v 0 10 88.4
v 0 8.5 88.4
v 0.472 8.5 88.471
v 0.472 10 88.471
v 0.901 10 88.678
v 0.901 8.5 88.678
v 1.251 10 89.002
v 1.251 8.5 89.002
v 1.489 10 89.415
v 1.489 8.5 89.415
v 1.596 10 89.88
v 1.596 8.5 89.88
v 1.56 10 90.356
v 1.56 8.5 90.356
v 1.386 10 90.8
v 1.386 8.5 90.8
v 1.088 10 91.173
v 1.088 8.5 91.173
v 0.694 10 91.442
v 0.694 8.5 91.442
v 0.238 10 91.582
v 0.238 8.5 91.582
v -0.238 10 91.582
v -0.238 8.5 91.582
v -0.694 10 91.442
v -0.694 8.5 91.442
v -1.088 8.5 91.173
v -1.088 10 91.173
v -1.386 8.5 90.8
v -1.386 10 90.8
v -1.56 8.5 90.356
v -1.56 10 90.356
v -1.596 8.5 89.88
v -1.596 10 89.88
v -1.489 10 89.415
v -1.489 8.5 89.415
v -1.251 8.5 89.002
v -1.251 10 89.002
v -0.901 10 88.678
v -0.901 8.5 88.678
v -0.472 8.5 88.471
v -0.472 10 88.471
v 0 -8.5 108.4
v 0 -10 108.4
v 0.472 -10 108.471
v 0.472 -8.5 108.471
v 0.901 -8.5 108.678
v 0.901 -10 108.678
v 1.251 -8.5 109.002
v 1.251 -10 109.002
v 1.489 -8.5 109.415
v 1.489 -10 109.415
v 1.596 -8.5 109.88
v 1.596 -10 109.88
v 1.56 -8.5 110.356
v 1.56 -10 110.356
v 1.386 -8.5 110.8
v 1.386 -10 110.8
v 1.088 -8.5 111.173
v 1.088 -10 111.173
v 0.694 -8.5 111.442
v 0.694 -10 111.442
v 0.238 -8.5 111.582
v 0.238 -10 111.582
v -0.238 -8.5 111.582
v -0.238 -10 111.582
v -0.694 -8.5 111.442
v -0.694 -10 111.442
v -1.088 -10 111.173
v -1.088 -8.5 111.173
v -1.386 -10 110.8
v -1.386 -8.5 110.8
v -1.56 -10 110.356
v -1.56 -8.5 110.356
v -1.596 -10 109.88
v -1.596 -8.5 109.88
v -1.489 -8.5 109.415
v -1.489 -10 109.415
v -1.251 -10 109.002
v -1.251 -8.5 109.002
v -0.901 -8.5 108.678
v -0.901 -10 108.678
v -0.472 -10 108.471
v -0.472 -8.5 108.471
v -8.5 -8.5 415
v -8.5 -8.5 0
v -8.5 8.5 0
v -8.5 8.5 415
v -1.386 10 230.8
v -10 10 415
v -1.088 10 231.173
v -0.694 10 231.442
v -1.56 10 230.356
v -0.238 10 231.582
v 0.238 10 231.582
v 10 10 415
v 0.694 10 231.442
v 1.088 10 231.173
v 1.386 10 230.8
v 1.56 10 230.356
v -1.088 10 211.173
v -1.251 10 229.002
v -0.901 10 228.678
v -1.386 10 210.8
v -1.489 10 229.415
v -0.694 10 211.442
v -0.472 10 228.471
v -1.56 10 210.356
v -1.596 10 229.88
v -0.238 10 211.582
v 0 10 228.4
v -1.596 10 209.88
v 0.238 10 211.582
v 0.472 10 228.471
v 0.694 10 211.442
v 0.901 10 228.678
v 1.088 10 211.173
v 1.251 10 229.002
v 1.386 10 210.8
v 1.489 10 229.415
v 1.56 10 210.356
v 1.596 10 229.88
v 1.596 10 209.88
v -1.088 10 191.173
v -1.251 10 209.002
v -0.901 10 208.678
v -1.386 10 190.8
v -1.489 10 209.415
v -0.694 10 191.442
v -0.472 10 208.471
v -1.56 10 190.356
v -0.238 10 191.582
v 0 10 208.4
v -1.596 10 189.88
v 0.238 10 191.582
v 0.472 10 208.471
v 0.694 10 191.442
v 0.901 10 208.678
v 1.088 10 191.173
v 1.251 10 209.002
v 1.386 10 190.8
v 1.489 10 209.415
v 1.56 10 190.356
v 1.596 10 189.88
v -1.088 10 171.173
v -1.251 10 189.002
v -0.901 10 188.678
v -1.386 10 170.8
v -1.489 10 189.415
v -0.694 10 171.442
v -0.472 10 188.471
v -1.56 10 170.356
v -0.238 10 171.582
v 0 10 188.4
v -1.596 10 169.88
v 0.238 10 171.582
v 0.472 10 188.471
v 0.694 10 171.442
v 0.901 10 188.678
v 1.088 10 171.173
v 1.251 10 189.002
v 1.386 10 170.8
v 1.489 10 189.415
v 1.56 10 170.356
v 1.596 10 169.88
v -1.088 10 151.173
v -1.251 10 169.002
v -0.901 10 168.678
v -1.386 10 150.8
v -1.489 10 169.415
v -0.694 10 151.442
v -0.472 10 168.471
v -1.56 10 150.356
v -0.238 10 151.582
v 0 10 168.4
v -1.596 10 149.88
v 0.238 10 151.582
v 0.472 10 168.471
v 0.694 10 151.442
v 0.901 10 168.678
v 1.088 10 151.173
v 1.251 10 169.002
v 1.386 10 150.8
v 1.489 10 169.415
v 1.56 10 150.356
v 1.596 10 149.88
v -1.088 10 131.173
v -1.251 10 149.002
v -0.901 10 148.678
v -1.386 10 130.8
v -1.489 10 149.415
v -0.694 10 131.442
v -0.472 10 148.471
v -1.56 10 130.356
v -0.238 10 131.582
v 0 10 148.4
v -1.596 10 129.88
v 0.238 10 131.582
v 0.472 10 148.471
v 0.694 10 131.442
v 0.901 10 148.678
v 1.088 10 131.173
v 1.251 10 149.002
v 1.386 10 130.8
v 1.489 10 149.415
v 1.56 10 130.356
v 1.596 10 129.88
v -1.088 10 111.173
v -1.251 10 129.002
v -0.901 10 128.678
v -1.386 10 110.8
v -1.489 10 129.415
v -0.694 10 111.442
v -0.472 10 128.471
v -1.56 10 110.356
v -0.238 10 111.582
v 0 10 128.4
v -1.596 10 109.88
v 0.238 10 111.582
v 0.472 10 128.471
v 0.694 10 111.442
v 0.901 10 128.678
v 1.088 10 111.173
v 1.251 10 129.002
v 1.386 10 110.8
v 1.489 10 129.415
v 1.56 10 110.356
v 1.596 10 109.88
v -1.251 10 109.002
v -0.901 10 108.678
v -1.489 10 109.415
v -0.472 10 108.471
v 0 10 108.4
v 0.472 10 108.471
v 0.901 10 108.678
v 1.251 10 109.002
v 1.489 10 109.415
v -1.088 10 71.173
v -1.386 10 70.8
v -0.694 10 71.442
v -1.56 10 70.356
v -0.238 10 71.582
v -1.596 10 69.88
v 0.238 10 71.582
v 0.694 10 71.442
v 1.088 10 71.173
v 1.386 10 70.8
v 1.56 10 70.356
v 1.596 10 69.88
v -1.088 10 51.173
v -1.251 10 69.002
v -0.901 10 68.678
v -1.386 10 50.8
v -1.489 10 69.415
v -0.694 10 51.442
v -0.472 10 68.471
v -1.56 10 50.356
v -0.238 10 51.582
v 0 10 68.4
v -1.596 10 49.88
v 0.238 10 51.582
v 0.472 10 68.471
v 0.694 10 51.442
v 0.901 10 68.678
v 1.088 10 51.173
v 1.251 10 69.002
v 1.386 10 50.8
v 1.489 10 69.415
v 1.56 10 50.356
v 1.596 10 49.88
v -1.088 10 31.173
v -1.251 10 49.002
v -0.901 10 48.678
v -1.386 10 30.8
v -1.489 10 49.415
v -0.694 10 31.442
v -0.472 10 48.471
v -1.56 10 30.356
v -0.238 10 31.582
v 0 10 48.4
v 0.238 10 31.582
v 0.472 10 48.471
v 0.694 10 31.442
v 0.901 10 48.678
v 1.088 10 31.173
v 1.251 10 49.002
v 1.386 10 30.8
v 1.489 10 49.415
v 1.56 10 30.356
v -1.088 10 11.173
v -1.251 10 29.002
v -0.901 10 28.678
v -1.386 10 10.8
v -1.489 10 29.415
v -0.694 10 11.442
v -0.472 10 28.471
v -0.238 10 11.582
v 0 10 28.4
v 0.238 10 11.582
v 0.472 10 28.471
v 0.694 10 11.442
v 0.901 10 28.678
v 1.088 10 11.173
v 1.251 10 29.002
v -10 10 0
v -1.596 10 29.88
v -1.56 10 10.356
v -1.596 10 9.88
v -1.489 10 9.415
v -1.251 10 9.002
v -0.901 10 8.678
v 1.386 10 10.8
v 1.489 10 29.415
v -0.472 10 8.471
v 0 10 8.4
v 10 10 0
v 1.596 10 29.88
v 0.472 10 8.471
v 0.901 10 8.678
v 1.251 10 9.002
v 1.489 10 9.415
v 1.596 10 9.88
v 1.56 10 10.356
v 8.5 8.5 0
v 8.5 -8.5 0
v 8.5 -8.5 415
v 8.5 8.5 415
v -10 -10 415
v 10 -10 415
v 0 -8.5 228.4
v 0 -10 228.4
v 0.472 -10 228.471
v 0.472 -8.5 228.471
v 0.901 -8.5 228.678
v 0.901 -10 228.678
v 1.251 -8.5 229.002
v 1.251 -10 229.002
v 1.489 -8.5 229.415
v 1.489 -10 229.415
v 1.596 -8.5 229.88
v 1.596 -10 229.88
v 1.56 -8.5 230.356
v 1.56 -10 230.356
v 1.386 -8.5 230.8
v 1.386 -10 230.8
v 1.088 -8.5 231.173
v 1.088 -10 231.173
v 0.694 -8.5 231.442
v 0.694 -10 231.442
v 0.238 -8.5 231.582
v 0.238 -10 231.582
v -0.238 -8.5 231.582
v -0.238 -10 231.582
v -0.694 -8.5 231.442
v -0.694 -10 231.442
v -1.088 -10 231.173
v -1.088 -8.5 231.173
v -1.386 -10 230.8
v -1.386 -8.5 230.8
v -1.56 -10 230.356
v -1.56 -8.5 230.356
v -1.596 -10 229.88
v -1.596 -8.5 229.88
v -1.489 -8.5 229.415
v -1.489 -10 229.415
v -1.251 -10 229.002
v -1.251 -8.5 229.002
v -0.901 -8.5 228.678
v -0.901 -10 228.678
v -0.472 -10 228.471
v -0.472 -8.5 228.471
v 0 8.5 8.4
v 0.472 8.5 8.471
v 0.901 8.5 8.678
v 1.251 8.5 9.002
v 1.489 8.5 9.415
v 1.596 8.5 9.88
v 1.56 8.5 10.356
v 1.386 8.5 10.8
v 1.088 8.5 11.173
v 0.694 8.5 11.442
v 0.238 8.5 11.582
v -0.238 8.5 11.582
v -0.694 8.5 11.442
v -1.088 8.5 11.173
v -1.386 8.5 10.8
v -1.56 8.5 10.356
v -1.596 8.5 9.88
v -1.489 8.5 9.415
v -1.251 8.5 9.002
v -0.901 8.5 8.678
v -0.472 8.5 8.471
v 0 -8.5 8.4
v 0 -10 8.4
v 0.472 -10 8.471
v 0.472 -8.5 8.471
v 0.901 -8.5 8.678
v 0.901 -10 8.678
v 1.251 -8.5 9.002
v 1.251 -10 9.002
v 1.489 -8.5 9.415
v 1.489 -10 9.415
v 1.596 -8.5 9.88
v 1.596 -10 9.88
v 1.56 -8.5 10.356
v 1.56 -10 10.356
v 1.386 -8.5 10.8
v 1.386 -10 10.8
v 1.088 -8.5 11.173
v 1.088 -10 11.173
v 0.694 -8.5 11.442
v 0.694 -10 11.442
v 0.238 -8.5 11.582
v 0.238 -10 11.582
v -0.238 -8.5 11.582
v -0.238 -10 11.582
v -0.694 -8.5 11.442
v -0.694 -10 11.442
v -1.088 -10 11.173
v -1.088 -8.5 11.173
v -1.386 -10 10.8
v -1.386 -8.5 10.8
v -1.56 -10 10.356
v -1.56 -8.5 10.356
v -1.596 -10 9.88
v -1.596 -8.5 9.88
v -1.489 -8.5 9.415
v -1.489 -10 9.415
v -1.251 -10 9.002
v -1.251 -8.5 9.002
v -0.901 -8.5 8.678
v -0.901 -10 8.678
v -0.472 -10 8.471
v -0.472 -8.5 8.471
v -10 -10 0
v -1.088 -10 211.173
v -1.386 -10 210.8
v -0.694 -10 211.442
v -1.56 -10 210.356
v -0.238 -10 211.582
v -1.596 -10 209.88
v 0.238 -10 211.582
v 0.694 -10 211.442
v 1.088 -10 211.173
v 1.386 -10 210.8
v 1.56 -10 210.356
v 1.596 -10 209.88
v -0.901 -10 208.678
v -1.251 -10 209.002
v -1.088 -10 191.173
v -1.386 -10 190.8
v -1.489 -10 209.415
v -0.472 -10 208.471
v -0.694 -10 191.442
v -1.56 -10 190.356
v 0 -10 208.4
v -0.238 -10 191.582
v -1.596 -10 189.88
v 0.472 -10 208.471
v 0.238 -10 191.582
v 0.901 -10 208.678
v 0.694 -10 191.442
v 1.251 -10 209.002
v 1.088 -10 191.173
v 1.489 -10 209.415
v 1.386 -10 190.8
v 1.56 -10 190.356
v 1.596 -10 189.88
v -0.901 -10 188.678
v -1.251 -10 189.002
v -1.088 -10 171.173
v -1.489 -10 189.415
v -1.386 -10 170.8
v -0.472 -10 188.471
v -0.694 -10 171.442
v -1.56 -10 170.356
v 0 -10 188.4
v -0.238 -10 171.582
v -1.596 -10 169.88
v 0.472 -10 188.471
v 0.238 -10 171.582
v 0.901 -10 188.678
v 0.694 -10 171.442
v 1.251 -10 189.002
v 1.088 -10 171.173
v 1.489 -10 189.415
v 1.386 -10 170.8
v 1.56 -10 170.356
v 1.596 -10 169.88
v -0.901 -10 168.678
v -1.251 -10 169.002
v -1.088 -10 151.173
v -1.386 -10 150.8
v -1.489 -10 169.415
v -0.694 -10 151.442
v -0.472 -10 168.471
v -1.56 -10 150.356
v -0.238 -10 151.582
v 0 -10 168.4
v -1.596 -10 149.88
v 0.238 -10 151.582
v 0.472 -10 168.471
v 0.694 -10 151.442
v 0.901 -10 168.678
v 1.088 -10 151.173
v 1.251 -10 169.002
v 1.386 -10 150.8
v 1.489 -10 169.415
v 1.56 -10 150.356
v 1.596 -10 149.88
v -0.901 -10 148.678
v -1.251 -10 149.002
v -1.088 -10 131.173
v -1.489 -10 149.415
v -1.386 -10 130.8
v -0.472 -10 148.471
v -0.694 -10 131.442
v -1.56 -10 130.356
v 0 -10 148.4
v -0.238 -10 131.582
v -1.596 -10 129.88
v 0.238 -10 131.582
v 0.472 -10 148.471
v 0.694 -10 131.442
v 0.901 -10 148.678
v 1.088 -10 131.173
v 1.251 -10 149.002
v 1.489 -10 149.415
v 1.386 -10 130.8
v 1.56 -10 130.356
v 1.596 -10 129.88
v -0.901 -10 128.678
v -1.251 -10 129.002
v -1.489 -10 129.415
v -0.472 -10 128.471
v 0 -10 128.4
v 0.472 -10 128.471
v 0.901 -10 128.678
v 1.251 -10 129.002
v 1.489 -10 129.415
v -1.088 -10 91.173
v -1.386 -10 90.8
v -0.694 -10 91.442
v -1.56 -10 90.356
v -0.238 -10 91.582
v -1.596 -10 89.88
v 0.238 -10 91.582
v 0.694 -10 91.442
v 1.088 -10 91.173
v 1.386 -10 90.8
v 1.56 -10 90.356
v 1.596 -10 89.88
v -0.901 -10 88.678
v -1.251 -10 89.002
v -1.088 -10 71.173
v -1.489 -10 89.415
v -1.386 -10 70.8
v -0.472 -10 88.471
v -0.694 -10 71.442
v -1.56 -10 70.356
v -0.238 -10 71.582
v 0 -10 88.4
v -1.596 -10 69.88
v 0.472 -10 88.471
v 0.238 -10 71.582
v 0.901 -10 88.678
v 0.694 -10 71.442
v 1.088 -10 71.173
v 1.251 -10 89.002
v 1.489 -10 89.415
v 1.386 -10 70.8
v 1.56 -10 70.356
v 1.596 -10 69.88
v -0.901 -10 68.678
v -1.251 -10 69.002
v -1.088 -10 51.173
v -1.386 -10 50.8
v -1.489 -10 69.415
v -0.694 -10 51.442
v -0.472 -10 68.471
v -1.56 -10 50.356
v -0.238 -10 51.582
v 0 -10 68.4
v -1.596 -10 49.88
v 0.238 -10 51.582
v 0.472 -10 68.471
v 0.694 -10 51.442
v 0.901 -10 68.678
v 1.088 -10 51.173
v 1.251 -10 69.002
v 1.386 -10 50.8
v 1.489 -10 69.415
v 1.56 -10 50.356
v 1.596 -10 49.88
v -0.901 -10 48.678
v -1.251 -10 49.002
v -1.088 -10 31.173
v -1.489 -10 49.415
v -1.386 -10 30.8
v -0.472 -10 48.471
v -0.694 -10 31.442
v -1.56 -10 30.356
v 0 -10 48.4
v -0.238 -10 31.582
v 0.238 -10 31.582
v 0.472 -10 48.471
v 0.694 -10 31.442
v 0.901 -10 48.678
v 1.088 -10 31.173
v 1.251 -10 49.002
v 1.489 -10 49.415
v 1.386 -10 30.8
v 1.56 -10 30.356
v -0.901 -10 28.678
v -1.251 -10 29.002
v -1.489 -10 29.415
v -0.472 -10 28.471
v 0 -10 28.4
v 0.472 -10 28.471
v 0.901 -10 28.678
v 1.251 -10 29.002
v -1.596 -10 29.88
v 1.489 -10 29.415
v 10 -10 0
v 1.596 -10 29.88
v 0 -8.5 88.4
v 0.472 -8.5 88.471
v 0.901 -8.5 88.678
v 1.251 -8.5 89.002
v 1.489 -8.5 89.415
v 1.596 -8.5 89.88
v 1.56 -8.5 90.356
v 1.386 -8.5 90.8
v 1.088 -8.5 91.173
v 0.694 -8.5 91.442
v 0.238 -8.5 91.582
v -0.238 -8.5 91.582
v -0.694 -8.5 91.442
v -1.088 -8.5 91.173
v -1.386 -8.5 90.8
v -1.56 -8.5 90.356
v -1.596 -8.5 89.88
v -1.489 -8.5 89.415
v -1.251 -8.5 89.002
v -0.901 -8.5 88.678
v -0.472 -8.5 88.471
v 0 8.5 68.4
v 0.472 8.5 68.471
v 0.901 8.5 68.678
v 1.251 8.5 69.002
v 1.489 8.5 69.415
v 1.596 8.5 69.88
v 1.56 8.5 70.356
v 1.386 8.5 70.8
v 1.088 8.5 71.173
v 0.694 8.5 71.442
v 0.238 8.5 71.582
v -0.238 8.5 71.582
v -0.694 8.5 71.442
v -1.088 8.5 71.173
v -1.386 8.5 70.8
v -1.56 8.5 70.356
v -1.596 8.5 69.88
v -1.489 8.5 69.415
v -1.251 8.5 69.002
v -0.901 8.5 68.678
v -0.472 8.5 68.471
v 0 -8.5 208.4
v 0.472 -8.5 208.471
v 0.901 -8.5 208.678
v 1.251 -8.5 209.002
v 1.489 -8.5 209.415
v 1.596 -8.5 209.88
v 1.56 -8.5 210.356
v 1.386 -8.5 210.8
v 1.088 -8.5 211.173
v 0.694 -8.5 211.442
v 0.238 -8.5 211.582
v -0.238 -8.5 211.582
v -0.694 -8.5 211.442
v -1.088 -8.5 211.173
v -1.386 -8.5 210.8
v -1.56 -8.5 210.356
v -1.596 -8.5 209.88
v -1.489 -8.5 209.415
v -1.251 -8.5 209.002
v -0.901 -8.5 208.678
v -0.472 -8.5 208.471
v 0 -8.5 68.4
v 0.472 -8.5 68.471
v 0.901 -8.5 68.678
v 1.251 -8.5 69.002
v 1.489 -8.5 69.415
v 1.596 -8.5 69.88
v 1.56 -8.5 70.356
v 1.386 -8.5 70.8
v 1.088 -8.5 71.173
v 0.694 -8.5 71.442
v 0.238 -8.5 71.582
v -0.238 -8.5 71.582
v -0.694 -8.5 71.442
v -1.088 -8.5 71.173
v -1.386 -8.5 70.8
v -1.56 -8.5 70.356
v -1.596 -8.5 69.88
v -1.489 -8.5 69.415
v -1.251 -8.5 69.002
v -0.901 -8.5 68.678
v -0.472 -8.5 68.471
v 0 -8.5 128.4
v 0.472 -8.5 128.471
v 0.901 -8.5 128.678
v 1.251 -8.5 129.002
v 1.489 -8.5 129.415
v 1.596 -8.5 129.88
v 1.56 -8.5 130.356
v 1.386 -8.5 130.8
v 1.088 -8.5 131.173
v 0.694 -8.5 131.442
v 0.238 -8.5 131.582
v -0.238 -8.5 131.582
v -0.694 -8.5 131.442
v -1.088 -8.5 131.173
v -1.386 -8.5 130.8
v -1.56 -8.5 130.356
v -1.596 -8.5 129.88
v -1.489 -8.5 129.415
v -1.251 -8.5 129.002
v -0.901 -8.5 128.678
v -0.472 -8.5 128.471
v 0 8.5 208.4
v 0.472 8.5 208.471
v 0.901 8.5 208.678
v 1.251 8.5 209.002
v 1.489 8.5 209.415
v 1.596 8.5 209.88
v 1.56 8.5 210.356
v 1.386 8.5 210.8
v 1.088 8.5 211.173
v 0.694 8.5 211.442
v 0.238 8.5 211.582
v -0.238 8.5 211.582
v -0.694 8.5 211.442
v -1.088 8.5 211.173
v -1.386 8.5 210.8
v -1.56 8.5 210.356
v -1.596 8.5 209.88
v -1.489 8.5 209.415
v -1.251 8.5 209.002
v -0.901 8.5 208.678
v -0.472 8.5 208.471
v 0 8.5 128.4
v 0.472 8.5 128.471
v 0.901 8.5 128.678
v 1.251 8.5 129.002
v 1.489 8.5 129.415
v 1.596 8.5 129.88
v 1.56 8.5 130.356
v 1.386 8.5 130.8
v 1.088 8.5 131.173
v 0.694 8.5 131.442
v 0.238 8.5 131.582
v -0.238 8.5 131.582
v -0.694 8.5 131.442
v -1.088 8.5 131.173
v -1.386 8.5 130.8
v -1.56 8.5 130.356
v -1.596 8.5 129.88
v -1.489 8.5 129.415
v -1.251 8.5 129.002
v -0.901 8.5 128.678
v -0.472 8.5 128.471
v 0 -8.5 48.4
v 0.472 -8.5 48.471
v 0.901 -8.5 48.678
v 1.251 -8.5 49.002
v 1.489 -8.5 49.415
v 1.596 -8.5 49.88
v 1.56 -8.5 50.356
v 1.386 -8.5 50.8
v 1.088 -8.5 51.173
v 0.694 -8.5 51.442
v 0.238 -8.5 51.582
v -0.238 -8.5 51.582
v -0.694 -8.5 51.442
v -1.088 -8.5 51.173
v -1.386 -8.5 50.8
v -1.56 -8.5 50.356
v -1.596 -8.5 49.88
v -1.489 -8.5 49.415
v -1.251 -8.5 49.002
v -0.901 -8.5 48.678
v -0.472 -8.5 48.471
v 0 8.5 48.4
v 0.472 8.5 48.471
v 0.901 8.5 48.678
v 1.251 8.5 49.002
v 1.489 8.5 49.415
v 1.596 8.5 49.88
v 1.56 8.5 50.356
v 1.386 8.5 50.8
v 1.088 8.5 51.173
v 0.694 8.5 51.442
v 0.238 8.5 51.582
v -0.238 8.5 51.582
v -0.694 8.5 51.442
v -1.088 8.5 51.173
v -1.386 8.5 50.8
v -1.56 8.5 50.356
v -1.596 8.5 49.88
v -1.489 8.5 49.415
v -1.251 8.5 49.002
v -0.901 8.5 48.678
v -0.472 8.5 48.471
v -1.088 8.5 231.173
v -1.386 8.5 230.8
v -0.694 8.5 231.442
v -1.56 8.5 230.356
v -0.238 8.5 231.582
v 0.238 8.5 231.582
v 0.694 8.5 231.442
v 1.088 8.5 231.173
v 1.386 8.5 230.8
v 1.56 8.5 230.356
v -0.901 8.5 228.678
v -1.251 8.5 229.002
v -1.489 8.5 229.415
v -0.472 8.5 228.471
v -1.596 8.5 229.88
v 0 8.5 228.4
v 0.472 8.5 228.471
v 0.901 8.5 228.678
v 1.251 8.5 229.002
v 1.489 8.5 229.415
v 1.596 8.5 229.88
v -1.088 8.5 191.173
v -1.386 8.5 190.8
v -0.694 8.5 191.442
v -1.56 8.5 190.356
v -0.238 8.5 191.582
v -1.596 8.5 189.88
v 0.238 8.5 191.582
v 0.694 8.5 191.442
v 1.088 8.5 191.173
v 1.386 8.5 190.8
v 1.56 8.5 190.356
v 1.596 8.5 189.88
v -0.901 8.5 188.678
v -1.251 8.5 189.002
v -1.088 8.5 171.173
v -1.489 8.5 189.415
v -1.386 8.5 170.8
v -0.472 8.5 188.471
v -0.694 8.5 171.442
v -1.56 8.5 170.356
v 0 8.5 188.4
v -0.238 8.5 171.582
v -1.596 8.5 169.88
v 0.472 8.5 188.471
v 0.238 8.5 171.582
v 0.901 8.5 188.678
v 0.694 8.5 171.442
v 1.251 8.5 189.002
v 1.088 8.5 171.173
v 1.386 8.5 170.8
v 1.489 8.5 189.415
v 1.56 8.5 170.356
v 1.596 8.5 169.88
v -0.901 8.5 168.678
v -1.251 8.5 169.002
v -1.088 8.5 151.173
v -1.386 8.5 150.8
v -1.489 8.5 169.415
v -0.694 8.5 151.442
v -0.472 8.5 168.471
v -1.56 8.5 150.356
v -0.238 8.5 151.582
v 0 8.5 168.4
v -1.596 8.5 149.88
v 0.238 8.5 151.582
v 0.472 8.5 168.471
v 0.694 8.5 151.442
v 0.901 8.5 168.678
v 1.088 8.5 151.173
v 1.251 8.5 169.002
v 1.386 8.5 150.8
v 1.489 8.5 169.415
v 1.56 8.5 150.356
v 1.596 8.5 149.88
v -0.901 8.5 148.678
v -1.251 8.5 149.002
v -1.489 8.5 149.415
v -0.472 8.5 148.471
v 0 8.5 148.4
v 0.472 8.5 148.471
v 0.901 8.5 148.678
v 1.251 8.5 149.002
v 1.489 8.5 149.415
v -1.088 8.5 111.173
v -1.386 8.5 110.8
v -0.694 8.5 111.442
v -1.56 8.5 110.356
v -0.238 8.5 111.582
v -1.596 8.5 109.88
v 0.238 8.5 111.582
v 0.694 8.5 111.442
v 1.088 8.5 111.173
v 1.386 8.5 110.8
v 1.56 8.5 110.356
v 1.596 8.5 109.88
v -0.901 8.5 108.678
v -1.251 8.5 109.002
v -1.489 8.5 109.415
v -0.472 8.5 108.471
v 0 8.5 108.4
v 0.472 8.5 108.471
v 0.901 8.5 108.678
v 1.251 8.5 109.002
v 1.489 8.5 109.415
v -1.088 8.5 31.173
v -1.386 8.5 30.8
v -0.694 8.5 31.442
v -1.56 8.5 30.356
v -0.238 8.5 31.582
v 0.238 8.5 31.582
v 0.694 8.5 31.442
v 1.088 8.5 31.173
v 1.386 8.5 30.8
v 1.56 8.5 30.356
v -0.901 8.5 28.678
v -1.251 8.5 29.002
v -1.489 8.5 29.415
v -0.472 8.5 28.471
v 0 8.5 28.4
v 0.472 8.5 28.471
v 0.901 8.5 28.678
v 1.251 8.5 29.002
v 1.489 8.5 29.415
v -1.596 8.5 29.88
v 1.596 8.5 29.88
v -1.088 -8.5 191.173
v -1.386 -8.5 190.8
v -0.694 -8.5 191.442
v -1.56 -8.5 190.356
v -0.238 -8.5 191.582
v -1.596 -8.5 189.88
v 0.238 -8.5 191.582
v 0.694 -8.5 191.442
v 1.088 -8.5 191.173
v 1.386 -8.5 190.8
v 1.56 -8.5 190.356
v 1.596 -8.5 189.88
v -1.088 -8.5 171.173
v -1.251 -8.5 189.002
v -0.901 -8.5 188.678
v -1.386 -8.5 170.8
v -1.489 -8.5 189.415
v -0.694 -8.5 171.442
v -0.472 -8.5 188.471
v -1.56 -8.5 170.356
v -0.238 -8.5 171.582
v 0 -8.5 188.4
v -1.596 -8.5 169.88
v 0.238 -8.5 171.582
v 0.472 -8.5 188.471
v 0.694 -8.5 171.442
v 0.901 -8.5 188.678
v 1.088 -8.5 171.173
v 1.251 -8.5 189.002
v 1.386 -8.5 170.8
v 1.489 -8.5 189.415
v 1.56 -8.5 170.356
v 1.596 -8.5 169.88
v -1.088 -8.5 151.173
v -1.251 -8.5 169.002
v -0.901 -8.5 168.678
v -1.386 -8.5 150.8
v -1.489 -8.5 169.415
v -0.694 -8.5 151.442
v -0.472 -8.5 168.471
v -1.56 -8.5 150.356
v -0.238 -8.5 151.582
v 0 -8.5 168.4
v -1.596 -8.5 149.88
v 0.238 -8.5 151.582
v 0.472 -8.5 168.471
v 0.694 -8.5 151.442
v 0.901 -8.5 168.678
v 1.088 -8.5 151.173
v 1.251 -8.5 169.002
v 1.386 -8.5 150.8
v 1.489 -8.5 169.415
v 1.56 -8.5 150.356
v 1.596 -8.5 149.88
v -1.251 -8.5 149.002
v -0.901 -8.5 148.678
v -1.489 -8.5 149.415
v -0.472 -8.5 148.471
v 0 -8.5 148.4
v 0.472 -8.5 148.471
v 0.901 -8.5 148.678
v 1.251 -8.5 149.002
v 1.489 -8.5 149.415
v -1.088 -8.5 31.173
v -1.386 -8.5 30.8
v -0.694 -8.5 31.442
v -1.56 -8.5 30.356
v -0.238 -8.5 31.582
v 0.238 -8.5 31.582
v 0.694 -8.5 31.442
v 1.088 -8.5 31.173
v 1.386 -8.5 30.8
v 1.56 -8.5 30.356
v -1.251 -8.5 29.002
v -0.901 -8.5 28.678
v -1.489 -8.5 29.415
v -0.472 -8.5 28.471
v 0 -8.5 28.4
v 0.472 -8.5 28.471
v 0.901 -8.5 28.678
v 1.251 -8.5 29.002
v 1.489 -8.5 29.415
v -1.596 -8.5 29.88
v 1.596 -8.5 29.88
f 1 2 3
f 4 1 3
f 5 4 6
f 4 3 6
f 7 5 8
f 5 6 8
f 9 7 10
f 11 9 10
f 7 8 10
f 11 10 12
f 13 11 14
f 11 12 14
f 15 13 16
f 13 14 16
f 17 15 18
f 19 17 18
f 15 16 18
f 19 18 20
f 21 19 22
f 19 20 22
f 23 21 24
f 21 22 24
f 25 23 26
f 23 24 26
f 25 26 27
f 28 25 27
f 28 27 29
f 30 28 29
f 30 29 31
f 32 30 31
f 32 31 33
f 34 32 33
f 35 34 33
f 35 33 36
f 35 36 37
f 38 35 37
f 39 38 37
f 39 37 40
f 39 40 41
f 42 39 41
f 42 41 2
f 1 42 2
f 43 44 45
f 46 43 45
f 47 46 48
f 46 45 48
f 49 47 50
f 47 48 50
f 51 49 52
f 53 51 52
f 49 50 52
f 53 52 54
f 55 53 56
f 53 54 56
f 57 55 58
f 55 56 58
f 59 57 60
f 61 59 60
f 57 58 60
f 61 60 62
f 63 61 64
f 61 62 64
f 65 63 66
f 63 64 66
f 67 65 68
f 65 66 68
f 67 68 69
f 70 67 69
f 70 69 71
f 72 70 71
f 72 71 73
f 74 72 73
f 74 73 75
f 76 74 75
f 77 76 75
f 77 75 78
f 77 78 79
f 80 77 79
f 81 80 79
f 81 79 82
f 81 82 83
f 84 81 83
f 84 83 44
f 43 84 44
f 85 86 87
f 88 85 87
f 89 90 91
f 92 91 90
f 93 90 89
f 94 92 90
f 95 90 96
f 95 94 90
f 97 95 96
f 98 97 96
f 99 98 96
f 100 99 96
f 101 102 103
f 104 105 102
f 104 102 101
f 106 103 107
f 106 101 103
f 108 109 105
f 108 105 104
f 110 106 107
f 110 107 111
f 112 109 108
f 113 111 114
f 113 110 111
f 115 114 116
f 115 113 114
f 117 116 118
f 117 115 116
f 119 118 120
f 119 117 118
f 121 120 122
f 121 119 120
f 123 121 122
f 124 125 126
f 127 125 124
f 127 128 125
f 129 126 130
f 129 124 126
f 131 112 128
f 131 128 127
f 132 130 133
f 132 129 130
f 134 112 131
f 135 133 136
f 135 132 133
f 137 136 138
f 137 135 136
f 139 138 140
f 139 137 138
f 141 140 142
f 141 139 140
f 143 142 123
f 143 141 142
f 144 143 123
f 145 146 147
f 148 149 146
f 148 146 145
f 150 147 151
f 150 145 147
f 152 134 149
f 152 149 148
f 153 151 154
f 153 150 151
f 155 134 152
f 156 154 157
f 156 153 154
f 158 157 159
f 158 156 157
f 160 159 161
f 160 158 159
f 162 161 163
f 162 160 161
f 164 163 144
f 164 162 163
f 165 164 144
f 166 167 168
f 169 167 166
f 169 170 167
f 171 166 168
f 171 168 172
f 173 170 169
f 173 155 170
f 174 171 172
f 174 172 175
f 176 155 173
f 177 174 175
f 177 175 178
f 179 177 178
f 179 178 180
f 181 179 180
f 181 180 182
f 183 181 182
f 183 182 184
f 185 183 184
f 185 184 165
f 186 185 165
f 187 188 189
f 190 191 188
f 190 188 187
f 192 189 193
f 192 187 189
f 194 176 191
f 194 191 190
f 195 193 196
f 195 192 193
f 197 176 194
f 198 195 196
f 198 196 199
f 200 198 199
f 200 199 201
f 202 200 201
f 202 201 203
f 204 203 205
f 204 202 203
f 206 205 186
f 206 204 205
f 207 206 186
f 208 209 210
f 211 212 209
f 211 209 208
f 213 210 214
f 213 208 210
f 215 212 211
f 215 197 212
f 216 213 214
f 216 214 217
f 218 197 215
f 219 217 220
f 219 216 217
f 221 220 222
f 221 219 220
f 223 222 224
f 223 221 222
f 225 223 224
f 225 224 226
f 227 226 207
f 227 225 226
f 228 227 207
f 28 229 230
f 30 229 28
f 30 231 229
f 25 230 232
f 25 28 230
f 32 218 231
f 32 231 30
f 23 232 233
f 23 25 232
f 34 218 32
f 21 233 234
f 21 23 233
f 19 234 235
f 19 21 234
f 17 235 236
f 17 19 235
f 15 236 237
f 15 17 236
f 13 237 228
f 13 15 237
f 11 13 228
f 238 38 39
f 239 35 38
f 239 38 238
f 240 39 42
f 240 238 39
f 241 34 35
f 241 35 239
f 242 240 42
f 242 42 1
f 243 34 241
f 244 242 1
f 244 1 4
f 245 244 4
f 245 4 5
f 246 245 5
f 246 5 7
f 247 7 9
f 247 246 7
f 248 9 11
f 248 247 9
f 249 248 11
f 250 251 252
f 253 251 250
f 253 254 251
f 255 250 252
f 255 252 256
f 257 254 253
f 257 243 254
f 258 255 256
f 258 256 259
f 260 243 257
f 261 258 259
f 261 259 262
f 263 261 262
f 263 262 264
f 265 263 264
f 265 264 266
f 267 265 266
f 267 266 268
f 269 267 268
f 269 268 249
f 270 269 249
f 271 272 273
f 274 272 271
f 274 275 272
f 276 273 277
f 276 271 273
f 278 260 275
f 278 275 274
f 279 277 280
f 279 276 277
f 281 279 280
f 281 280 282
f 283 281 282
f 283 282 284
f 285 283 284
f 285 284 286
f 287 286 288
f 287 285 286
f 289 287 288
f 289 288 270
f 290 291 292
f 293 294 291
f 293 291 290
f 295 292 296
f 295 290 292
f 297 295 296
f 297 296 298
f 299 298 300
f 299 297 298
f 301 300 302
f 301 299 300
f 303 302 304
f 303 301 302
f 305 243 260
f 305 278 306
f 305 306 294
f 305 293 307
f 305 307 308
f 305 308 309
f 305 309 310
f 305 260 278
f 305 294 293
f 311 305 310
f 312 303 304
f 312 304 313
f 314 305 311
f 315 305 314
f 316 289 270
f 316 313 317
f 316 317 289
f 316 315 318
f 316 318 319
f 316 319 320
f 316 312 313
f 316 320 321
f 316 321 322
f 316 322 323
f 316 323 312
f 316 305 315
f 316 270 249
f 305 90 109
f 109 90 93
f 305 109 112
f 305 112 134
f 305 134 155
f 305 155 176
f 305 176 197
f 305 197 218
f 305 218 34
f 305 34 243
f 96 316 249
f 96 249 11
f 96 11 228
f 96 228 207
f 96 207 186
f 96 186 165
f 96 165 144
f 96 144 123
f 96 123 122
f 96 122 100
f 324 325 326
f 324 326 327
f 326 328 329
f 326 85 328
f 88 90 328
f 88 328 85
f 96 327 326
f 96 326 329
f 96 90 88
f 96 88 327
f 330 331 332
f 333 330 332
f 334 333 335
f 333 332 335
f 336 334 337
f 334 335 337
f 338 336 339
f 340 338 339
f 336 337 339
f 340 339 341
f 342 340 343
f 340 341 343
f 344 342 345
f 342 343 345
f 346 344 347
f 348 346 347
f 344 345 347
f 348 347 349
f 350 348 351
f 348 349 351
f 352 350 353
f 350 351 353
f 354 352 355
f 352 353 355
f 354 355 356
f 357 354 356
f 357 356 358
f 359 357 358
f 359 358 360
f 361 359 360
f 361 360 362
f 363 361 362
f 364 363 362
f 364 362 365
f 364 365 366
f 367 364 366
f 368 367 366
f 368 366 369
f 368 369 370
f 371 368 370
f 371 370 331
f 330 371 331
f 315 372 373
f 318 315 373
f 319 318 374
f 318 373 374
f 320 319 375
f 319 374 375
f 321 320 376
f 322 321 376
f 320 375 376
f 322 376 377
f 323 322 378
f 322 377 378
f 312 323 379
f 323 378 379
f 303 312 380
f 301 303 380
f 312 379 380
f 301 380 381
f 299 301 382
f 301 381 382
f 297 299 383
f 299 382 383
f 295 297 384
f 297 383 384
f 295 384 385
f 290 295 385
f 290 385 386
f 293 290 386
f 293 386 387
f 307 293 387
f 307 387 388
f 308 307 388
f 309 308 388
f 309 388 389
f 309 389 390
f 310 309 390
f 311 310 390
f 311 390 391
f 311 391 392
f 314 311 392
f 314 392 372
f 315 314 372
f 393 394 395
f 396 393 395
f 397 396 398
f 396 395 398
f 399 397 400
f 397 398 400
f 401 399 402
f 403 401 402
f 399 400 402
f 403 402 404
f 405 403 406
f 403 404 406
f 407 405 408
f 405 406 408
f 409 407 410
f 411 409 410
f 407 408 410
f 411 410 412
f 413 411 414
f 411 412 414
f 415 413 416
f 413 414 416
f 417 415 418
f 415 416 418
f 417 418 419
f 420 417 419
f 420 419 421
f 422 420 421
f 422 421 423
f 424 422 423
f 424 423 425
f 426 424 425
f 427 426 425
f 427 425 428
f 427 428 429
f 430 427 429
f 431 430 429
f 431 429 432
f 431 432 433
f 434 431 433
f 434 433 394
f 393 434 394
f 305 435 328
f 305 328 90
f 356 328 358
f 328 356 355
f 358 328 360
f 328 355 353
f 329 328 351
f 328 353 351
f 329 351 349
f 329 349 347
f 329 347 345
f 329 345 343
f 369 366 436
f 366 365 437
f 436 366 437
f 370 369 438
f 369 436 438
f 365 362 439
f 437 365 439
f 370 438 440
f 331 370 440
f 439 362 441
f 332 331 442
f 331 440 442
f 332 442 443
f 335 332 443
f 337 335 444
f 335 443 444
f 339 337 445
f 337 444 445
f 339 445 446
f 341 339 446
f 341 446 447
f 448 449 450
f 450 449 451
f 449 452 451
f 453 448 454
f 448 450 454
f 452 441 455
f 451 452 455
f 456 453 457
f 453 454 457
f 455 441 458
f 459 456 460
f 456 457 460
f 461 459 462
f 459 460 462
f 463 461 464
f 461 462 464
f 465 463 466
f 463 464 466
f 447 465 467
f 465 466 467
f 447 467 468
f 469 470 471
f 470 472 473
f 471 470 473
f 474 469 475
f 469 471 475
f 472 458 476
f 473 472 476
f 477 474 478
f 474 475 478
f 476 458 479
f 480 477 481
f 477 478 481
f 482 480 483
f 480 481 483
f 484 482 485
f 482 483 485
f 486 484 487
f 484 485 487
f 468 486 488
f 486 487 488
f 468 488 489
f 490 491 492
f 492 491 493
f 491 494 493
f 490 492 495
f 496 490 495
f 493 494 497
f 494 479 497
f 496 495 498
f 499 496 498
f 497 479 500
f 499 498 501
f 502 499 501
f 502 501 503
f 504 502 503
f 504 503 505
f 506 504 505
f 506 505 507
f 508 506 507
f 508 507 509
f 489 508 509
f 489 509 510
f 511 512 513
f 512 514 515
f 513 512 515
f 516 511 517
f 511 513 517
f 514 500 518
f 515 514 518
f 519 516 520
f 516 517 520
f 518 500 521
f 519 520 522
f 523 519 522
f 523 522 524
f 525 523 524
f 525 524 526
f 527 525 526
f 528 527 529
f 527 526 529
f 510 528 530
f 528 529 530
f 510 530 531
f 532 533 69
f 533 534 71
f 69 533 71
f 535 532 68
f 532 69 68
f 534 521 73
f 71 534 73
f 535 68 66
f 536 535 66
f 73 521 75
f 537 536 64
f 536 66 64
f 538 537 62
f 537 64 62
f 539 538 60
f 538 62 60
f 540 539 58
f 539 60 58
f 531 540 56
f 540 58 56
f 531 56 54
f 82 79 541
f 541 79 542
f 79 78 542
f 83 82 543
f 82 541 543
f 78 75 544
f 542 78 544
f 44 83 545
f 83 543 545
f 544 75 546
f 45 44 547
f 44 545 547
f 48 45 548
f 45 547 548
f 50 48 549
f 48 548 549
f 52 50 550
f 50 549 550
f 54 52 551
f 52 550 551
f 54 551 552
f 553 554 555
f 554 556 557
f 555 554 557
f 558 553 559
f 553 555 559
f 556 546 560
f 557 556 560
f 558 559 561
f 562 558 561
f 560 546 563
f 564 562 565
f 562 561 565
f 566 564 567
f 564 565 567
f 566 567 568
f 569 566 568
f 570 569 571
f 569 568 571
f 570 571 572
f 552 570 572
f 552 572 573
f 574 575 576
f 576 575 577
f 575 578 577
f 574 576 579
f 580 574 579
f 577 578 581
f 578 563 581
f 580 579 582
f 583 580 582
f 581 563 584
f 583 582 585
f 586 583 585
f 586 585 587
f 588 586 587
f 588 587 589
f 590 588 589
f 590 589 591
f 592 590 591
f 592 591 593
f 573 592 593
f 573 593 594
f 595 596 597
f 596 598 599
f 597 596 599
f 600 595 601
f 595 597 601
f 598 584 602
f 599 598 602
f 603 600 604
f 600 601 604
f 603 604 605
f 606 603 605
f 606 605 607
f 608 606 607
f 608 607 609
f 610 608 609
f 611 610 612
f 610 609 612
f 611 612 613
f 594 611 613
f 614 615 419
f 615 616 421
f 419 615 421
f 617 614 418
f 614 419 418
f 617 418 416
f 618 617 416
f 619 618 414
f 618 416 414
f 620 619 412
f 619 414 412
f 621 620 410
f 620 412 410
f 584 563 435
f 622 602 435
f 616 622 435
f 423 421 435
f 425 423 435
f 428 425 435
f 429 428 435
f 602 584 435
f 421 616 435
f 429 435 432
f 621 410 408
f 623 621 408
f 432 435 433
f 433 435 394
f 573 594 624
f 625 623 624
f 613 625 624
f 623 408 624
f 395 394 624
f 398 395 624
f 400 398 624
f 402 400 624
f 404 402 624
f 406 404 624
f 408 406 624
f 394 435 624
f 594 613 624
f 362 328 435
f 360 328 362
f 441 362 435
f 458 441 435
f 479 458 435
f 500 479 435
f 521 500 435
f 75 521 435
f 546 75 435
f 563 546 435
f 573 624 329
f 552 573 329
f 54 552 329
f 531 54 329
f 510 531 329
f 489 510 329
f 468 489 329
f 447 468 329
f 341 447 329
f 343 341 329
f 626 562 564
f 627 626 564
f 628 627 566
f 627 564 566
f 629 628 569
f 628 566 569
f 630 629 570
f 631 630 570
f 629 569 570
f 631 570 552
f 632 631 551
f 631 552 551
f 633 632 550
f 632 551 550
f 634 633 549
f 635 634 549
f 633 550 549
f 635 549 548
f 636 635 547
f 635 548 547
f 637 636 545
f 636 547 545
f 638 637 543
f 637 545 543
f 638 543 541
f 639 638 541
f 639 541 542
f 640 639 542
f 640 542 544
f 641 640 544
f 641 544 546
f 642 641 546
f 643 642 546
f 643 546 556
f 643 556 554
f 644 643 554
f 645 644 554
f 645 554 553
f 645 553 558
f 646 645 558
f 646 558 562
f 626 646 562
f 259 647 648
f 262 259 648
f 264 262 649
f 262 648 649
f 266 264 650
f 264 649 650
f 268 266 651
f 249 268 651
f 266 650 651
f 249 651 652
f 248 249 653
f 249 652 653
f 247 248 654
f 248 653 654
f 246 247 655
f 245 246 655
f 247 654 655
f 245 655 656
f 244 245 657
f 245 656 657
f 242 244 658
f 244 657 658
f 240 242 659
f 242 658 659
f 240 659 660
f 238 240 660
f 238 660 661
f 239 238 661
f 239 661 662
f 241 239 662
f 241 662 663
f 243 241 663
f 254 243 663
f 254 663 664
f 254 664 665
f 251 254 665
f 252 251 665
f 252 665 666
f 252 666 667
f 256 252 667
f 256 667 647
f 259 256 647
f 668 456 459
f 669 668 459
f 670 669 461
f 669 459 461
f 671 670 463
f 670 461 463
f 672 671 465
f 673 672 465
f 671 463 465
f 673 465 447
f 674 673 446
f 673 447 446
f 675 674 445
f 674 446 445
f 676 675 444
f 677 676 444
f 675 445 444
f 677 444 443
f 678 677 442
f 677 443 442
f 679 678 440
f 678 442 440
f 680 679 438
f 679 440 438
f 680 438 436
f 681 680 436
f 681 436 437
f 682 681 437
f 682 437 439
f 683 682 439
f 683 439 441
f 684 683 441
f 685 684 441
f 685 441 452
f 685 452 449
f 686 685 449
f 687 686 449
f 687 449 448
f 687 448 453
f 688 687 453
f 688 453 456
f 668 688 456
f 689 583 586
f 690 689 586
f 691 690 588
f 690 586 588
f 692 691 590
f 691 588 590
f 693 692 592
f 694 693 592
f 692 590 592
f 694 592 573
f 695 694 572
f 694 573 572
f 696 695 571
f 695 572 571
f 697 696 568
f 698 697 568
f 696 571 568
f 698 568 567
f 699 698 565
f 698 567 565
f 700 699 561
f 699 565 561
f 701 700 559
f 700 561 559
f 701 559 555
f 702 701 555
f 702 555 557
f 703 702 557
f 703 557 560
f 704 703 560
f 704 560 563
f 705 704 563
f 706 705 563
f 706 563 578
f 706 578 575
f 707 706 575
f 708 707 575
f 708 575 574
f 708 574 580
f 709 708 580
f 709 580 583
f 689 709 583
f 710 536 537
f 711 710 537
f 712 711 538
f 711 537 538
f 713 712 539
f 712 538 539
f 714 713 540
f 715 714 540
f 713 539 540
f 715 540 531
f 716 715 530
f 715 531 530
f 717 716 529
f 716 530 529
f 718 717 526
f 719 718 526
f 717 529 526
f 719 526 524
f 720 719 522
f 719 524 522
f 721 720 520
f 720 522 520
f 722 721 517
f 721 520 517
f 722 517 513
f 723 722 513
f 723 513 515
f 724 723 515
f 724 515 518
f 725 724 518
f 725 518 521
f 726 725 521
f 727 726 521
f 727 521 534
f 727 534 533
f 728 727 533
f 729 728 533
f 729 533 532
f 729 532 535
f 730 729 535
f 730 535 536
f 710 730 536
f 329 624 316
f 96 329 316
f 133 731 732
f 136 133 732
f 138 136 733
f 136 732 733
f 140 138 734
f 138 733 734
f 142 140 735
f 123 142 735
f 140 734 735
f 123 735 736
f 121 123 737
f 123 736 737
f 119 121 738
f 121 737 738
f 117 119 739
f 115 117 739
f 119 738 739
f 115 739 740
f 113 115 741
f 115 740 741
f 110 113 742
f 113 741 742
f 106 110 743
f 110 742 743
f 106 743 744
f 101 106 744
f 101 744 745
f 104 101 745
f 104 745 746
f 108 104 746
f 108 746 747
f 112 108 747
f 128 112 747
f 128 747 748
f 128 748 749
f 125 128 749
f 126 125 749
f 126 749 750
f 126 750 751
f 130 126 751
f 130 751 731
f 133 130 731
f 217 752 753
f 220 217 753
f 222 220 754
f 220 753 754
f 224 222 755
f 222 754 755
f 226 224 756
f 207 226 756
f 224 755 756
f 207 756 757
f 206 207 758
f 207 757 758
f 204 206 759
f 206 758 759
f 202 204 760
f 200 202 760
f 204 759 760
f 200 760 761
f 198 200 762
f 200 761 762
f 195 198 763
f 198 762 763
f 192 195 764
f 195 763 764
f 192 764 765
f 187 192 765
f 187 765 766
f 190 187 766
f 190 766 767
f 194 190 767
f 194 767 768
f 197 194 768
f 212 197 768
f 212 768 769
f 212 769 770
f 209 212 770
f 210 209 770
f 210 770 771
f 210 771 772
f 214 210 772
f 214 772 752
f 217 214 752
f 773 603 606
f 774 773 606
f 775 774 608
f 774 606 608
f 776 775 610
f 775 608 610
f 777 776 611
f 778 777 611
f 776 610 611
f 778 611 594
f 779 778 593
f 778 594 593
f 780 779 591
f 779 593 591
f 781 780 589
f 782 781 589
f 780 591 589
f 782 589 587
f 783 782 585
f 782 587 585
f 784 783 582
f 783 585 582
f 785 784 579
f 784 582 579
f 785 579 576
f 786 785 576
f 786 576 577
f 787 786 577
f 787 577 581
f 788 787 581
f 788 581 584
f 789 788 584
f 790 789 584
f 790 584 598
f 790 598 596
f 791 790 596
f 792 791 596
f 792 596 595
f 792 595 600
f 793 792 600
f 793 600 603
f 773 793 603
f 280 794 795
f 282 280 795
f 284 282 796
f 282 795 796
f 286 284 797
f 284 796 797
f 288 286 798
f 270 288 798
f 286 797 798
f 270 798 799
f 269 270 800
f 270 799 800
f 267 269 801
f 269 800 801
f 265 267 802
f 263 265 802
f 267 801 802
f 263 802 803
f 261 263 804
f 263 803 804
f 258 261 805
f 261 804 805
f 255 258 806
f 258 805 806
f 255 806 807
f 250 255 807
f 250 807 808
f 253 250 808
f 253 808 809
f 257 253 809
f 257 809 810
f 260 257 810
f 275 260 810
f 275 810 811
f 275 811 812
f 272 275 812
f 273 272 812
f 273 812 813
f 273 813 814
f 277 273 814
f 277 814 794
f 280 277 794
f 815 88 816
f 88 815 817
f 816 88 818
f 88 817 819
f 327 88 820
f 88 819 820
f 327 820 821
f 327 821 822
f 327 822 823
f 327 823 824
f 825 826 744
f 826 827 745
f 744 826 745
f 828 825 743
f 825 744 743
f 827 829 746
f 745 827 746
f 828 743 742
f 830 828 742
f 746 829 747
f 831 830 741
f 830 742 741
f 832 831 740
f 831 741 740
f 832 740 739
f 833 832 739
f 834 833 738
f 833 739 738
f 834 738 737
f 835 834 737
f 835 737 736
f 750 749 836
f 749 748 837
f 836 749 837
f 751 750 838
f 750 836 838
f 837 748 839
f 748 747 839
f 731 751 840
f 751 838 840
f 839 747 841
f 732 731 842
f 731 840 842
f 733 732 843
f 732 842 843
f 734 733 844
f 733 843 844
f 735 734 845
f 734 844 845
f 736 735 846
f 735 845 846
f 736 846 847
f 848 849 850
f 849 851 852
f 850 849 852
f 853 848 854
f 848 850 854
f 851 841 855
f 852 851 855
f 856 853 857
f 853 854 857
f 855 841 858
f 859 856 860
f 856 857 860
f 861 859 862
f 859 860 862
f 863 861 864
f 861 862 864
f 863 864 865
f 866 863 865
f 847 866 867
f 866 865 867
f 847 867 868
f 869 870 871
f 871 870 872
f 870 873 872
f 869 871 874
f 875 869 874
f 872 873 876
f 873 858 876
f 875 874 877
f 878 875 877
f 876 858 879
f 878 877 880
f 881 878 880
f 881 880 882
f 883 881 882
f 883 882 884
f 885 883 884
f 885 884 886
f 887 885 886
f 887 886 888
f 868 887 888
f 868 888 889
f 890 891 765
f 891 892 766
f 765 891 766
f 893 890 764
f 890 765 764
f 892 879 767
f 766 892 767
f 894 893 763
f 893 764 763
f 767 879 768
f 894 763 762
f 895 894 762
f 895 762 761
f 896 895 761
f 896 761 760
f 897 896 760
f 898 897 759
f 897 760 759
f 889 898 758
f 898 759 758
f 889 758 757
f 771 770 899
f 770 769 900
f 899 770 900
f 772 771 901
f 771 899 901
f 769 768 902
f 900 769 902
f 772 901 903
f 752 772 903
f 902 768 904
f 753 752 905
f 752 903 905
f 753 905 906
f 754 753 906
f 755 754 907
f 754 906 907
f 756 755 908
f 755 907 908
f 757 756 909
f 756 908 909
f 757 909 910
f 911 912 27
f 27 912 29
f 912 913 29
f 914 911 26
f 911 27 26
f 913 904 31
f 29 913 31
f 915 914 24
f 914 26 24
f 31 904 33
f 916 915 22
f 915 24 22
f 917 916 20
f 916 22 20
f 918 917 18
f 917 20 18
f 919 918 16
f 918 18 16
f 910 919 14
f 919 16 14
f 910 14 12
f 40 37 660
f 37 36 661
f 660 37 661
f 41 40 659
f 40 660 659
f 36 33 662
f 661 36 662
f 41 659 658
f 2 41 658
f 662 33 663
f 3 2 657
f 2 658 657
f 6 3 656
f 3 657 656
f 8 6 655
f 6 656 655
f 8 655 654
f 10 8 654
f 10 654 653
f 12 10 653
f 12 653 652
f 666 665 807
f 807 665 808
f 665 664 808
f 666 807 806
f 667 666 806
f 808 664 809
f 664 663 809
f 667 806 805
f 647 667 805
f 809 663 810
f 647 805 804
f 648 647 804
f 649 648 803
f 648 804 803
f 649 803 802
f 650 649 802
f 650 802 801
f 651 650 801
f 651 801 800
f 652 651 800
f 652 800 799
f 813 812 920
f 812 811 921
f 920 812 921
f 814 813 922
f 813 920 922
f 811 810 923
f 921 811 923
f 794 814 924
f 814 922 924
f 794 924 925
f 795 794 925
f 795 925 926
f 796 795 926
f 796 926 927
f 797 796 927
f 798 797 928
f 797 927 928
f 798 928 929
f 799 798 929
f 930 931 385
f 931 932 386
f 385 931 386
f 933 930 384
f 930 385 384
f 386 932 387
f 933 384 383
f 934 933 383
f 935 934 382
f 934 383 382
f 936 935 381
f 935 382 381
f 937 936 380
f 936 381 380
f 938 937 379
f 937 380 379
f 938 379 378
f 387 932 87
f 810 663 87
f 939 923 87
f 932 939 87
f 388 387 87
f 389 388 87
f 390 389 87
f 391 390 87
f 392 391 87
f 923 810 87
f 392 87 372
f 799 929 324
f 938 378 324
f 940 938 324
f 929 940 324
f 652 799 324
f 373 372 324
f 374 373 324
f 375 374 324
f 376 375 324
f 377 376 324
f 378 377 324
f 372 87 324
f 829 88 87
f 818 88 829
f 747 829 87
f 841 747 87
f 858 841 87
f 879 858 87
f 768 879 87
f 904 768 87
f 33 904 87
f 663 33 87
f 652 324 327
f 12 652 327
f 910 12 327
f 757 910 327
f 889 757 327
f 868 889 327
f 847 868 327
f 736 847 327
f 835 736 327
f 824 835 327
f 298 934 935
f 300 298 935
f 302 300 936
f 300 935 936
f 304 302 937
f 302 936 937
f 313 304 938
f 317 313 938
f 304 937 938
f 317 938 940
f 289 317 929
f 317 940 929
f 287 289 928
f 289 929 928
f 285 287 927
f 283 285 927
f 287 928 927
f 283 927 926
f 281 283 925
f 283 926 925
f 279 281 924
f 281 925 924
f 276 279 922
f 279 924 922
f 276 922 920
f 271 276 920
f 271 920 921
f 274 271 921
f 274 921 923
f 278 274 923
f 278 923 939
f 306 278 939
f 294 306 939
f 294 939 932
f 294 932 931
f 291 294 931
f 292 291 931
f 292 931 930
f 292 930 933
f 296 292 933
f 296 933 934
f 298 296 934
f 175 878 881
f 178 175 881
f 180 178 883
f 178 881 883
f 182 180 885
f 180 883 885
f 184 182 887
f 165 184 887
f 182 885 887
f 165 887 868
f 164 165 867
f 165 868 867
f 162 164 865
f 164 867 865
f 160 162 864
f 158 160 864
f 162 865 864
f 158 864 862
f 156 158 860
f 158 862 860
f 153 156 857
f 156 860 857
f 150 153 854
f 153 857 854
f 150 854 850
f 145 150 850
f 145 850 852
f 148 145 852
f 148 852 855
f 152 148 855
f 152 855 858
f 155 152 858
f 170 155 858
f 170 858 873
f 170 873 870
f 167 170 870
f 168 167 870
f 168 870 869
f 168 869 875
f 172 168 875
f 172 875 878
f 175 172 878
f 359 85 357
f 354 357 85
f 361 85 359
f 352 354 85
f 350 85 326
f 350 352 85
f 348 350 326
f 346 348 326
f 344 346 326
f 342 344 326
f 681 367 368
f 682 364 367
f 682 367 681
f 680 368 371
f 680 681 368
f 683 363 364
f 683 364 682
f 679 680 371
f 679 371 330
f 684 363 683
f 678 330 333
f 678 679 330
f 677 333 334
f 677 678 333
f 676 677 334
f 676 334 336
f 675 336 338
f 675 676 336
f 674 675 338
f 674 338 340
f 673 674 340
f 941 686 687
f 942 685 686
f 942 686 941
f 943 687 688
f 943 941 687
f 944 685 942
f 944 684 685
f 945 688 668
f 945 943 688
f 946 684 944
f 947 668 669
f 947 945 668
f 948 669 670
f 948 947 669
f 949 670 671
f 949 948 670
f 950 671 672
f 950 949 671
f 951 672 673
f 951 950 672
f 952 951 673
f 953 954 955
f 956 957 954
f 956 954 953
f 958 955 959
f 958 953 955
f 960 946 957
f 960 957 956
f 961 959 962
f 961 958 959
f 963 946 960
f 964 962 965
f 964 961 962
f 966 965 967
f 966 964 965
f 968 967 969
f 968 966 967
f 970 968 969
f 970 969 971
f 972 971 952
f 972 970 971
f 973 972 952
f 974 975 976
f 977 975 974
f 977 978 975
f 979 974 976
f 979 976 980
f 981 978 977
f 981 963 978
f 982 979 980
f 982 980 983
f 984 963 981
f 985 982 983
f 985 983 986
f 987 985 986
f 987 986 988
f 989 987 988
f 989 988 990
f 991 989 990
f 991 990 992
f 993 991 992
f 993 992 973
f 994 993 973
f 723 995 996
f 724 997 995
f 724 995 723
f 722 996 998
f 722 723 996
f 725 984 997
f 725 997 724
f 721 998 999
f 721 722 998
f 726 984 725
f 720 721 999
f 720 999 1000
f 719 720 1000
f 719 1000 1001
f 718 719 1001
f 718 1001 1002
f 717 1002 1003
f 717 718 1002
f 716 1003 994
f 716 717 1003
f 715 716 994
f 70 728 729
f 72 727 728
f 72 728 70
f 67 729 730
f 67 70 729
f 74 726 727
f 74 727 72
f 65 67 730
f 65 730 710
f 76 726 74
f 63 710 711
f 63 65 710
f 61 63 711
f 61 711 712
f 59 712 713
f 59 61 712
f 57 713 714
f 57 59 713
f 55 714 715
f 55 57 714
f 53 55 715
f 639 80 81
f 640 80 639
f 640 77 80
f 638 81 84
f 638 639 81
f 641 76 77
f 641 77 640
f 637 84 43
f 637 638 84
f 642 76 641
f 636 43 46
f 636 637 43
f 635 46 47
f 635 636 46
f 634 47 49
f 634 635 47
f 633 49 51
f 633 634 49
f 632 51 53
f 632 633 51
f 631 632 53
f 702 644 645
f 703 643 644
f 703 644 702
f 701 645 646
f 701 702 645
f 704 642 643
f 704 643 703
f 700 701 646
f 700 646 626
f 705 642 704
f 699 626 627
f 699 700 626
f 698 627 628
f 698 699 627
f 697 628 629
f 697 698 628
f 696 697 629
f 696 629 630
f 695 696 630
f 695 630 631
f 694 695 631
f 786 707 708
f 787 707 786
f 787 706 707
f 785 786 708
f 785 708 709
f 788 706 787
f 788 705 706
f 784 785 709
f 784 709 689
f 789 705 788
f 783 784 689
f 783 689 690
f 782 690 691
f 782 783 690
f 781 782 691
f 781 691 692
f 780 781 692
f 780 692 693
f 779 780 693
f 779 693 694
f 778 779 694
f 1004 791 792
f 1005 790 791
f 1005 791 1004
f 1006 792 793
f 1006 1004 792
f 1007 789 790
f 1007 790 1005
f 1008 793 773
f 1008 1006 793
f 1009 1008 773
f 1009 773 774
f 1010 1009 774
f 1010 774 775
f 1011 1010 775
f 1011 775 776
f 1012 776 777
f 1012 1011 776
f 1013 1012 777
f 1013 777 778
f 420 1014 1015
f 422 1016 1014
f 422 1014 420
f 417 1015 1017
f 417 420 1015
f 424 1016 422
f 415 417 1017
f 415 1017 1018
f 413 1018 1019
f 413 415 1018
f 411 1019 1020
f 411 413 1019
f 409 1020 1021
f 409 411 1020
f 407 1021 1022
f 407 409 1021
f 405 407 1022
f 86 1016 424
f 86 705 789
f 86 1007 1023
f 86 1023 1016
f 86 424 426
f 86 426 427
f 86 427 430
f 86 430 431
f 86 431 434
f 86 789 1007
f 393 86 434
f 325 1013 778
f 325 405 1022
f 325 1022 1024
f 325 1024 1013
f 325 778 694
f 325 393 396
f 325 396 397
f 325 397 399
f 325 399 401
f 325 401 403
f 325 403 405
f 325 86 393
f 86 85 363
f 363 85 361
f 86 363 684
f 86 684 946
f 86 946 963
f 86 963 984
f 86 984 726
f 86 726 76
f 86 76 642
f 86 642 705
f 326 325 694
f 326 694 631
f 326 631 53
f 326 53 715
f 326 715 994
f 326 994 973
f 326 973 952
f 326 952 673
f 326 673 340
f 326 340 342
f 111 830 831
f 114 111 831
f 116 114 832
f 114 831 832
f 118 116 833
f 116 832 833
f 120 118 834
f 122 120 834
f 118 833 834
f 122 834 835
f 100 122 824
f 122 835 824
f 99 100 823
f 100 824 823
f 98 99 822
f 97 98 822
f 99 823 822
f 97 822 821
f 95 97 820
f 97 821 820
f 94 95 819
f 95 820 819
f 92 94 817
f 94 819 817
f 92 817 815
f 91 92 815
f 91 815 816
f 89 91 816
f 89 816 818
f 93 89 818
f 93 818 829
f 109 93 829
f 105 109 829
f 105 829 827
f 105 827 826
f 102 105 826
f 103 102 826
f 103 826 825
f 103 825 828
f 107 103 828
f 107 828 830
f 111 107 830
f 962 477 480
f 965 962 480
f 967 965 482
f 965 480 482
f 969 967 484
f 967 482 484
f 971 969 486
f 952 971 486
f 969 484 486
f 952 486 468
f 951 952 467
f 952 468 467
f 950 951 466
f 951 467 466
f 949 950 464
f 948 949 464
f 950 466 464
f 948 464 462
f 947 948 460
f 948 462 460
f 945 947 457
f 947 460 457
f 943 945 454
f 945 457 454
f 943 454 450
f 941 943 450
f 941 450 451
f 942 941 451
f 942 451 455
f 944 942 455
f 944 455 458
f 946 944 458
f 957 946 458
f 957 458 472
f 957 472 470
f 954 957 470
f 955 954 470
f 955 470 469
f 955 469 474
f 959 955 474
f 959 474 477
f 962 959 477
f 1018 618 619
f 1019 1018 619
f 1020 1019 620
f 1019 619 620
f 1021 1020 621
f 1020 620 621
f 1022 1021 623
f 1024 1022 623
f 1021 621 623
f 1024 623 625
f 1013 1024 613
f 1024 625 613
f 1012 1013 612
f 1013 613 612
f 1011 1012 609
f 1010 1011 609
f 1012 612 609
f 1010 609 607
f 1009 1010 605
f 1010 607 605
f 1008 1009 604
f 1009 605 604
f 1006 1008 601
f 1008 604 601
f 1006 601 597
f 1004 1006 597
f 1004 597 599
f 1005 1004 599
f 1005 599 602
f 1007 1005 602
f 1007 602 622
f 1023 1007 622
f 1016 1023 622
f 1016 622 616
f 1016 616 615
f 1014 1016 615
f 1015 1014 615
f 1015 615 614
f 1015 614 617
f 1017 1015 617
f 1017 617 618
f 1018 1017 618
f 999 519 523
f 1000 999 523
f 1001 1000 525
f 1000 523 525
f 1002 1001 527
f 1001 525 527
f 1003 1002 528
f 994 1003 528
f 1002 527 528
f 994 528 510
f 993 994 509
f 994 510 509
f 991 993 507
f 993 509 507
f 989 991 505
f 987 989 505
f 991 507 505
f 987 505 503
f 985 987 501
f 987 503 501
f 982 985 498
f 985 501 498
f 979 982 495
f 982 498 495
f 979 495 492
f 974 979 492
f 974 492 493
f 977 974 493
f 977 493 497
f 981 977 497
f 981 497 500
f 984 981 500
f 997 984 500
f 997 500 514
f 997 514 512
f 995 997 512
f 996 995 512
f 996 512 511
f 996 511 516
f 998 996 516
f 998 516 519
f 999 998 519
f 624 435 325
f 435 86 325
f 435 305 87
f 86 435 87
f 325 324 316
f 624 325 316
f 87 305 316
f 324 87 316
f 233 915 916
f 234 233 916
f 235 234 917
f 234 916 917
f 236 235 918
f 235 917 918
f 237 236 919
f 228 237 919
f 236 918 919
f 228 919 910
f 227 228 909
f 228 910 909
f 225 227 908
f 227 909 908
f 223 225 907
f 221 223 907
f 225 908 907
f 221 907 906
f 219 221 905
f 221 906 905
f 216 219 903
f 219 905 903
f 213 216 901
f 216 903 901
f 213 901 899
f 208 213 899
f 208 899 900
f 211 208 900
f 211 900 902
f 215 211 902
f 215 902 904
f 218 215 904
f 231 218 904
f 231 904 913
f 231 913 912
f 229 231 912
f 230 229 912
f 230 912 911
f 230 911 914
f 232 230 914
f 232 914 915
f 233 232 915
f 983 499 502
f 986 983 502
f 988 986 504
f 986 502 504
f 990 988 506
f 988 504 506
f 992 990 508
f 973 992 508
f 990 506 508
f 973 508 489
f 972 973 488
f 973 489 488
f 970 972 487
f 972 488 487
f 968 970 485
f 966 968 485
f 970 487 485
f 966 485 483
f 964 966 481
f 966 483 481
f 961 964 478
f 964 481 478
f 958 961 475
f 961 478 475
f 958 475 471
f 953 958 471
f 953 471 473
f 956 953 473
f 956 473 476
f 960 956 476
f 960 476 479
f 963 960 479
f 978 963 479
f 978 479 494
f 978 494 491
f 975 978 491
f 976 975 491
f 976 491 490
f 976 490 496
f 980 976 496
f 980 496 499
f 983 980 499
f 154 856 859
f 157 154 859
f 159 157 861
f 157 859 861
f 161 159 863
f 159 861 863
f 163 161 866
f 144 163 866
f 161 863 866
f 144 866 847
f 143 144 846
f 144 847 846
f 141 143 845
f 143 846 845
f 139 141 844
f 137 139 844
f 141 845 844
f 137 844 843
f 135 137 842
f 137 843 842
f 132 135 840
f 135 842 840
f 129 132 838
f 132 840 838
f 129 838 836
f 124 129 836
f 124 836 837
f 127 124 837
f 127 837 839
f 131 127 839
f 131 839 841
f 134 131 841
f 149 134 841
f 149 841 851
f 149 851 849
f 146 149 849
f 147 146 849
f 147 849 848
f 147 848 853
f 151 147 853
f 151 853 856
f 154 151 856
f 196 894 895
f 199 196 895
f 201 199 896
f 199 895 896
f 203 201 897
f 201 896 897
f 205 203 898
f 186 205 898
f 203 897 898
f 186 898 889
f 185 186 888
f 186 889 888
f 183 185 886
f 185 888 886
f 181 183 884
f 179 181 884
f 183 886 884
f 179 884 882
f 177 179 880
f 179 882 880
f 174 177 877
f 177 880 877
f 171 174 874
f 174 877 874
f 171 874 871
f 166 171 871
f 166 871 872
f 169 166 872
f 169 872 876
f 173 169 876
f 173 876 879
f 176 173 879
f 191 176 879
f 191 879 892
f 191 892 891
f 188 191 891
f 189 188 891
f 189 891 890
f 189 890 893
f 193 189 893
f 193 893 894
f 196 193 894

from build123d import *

# Parameters (mm, degrees)
SKETCH_1_W          = 20
SKETCH_1_H          = 20
SKETCH_1_W_2        = 17
SKETCH_1_H_2        = 17
EXTRUDE_1_DEPTH     = 415
SKETCH_5_R          = 1.6
CUT_EXTRUDE_4_DEPTH = 416.601973046


with BuildPart() as part:
    # 草图1 → 凸台-拉伸1 (new body)
    with BuildSketch(Plane.XY):
        Rectangle(SKETCH_1_W, SKETCH_1_H)
        Rectangle(SKETCH_1_W_2, SKETCH_1_H_2, mode=Mode.SUBTRACT)
    extrude(amount=EXTRUDE_1_DEPTH)

    # 草图5 → 切除-拉伸4 (cut, through all)
    with BuildSketch(Plane.XZ.offset(10)):
        with Locations(Location((0, 10, 0), (0, 0, 270))):
            Circle(SKETCH_5_R)
        with Locations(Location((0, 30, 0), (0, 0, 270))):
            Circle(SKETCH_5_R)
        with Locations(Location((0, 50, 0), (0, 0, 270))):
            Circle(SKETCH_5_R)
        with Locations(Location((0, 70, 0), (0, 0, 270))):
            Circle(SKETCH_5_R)
        with Locations(Location((0, 90, 0), (0, 0, 270))):
            Circle(SKETCH_5_R)
        with Locations(Location((0, 110, 0), (0, 0, 270))):
            Circle(SKETCH_5_R)
        with Locations(Location((0, 130, 0), (0, 0, 270))):
            Circle(SKETCH_5_R)
        with Locations(Location((0, 150, 0), (0, 0, 270))):
            Circle(SKETCH_5_R)
        with Locations(Location((0, 170, 0), (0, 0, 270))):
            Circle(SKETCH_5_R)
        with Locations(Location((0, 190, 0), (0, 0, 270))):
            Circle(SKETCH_5_R)
        with Locations(Location((0, 210, 0), (0, 0, 270))):
            Circle(SKETCH_5_R)
        with Locations(Location((0, 230, 0), (0, 0, 270))):
            Circle(SKETCH_5_R)
    extrude(amount=-CUT_EXTRUDE_4_DEPTH, mode=Mode.SUBTRACT)


solid = part.part
